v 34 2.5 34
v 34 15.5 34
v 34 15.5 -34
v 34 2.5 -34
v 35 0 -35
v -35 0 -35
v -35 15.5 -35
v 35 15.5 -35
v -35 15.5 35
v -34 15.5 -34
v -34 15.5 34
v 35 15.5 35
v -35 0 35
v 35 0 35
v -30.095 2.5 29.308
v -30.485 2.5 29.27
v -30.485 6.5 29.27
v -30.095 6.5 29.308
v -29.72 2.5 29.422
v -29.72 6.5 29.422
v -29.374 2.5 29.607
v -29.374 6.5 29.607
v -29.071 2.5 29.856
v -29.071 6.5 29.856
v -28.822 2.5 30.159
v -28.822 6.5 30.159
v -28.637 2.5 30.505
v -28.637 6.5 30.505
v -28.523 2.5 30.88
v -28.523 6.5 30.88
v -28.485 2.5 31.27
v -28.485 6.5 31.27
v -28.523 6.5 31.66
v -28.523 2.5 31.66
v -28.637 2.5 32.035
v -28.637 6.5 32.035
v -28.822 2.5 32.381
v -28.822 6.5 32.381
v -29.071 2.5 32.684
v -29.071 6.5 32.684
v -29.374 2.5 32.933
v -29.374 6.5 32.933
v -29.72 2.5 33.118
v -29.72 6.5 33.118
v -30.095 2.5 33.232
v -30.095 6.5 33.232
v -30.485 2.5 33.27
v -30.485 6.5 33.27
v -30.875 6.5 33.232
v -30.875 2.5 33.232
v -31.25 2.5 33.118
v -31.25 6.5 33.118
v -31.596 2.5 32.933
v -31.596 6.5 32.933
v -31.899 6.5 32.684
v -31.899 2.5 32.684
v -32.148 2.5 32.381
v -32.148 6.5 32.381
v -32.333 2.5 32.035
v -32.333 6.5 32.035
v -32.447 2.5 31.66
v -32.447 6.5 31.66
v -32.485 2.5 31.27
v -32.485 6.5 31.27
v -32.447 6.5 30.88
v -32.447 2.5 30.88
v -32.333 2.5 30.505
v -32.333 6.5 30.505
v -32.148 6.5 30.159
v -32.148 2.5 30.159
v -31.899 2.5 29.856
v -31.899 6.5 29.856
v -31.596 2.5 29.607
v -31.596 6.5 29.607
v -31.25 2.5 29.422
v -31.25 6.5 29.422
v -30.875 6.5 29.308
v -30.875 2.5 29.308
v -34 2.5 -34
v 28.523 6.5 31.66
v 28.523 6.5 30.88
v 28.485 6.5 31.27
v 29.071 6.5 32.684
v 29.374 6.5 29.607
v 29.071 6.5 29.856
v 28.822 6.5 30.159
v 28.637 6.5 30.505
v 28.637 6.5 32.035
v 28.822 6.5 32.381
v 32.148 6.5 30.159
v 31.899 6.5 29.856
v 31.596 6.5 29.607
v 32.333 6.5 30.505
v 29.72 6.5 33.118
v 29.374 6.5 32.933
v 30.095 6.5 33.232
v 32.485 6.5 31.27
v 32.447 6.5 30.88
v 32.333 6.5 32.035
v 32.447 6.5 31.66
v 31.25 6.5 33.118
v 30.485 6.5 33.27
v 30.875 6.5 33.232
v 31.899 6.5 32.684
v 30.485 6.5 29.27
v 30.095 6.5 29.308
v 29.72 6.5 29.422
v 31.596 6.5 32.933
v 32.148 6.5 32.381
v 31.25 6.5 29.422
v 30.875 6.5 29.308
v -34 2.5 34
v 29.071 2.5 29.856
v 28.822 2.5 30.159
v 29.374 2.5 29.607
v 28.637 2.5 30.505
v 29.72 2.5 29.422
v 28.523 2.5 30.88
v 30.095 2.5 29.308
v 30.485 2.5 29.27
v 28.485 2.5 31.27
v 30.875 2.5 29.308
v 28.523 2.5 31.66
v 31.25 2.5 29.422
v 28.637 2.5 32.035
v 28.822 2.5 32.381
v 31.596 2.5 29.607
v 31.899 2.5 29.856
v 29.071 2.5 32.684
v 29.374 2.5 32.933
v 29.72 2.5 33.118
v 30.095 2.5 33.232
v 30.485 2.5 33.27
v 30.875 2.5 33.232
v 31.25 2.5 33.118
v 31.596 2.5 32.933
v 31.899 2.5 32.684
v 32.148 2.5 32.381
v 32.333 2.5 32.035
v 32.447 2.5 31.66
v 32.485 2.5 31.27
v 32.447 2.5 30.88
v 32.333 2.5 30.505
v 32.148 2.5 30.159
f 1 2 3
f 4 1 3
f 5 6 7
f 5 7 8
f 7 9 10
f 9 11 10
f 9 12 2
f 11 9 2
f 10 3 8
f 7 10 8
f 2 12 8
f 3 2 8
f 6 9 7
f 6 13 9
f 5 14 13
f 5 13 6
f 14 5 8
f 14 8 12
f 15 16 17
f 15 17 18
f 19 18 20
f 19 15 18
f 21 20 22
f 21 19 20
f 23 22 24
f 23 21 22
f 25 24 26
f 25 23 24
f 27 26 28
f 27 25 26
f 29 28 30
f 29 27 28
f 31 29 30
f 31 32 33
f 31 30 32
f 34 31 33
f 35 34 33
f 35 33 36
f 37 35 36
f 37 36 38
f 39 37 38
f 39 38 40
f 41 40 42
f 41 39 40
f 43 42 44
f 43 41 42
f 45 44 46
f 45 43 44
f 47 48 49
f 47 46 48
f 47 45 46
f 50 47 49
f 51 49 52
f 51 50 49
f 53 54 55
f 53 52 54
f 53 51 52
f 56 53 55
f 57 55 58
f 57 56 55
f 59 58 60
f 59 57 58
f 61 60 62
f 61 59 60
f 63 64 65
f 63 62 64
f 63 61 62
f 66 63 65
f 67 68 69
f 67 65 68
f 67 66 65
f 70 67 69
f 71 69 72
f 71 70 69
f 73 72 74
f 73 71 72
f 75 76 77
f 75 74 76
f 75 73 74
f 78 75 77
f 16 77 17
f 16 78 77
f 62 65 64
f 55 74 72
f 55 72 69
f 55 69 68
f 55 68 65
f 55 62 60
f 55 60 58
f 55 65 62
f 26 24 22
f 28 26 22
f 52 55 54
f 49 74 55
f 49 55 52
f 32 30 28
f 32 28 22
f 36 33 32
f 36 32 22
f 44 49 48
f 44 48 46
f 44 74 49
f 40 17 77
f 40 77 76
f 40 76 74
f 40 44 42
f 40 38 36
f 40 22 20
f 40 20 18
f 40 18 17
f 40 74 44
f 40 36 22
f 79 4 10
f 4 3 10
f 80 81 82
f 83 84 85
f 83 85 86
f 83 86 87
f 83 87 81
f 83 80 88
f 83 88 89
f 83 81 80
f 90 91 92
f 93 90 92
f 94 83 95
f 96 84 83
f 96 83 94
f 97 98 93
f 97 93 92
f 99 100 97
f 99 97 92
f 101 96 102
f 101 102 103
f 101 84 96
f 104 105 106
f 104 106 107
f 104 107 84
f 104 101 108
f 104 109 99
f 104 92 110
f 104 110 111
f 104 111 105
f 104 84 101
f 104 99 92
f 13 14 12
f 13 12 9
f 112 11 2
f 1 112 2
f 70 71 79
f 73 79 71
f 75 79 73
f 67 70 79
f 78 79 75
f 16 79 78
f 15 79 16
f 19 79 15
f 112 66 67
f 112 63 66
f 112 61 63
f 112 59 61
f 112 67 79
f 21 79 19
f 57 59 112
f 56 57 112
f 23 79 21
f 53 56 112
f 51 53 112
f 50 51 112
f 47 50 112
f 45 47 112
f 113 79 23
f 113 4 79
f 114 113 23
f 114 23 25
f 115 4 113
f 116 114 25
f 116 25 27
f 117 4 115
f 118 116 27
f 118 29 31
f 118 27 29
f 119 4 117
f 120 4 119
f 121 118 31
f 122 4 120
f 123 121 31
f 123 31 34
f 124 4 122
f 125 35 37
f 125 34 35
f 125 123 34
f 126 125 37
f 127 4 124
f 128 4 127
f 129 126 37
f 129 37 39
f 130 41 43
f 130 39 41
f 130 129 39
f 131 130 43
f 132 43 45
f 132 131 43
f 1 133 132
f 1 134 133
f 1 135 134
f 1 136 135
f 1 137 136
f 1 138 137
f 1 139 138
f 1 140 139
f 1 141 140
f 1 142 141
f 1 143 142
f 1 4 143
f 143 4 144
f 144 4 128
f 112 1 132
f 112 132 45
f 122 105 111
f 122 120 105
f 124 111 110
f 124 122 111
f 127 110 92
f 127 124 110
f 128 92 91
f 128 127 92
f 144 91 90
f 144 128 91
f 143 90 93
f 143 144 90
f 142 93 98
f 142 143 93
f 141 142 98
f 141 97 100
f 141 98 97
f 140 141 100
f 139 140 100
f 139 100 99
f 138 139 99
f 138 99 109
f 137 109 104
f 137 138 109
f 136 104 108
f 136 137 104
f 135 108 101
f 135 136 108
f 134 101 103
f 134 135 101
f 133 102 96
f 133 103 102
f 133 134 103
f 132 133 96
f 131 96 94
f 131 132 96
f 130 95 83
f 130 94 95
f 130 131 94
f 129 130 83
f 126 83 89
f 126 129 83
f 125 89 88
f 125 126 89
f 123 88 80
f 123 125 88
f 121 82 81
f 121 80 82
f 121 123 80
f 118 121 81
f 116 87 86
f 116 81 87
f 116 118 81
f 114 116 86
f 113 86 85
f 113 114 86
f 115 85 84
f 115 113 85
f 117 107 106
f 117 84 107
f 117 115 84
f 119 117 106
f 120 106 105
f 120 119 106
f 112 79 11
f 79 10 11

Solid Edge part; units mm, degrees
sketch "Sketch1" plane through (0, 0, 0) normal (0, -1, 0) x (1, 0, 0)
  line L0 (-35, -35) -> (35, -35)
  line L1 (35, -35) -> (35, 35)
  line L2 (35, 35) -> (-35, 35)
  line L3 (-35, 35) -> (-35, -35)
  dimension "D1" = 70
  dimension "D2" = 70
extrude "Protrusion1" add sketch "Sketch1" against normal blind 15.5
sketch "Sketch2" plane through (0, 15.5, 0) normal (0, 1, 0) x (0, 0, -1)
  line L0 (-34, -34) -> (34, -34)
  line L1 (34, -34) -> (34, 34)
  line L2 (34, 34) -> (-34, 34)
  line L3 (-34, 34) -> (-34, -34)
  dimension "D1" = 68
  dimension "D2" = 68
extrude "Enlèvement_matière_1" cut sketch "Sketch2" against normal blind 13
sketch "Sketch3" plane through (0, 2.5, 0) normal (0, 1, 0) x (0, 0, -1)
  circle A0 centre (-31.27, -30.485) radius 2
  circle A1 centre (-31.27, 30.485) radius 2
  dimension "D1" = 4
  dimension "D2" = 4
  dimension "D3" = 60.97
  dimension "D4" = 2.73
  dimension "D5" = 2.73
  dimension "D6" = 3.515
  dimension "D7" = 3.515
extrude "Ajout_matière_2" add sketch "Sketch3" along normal blind 4
